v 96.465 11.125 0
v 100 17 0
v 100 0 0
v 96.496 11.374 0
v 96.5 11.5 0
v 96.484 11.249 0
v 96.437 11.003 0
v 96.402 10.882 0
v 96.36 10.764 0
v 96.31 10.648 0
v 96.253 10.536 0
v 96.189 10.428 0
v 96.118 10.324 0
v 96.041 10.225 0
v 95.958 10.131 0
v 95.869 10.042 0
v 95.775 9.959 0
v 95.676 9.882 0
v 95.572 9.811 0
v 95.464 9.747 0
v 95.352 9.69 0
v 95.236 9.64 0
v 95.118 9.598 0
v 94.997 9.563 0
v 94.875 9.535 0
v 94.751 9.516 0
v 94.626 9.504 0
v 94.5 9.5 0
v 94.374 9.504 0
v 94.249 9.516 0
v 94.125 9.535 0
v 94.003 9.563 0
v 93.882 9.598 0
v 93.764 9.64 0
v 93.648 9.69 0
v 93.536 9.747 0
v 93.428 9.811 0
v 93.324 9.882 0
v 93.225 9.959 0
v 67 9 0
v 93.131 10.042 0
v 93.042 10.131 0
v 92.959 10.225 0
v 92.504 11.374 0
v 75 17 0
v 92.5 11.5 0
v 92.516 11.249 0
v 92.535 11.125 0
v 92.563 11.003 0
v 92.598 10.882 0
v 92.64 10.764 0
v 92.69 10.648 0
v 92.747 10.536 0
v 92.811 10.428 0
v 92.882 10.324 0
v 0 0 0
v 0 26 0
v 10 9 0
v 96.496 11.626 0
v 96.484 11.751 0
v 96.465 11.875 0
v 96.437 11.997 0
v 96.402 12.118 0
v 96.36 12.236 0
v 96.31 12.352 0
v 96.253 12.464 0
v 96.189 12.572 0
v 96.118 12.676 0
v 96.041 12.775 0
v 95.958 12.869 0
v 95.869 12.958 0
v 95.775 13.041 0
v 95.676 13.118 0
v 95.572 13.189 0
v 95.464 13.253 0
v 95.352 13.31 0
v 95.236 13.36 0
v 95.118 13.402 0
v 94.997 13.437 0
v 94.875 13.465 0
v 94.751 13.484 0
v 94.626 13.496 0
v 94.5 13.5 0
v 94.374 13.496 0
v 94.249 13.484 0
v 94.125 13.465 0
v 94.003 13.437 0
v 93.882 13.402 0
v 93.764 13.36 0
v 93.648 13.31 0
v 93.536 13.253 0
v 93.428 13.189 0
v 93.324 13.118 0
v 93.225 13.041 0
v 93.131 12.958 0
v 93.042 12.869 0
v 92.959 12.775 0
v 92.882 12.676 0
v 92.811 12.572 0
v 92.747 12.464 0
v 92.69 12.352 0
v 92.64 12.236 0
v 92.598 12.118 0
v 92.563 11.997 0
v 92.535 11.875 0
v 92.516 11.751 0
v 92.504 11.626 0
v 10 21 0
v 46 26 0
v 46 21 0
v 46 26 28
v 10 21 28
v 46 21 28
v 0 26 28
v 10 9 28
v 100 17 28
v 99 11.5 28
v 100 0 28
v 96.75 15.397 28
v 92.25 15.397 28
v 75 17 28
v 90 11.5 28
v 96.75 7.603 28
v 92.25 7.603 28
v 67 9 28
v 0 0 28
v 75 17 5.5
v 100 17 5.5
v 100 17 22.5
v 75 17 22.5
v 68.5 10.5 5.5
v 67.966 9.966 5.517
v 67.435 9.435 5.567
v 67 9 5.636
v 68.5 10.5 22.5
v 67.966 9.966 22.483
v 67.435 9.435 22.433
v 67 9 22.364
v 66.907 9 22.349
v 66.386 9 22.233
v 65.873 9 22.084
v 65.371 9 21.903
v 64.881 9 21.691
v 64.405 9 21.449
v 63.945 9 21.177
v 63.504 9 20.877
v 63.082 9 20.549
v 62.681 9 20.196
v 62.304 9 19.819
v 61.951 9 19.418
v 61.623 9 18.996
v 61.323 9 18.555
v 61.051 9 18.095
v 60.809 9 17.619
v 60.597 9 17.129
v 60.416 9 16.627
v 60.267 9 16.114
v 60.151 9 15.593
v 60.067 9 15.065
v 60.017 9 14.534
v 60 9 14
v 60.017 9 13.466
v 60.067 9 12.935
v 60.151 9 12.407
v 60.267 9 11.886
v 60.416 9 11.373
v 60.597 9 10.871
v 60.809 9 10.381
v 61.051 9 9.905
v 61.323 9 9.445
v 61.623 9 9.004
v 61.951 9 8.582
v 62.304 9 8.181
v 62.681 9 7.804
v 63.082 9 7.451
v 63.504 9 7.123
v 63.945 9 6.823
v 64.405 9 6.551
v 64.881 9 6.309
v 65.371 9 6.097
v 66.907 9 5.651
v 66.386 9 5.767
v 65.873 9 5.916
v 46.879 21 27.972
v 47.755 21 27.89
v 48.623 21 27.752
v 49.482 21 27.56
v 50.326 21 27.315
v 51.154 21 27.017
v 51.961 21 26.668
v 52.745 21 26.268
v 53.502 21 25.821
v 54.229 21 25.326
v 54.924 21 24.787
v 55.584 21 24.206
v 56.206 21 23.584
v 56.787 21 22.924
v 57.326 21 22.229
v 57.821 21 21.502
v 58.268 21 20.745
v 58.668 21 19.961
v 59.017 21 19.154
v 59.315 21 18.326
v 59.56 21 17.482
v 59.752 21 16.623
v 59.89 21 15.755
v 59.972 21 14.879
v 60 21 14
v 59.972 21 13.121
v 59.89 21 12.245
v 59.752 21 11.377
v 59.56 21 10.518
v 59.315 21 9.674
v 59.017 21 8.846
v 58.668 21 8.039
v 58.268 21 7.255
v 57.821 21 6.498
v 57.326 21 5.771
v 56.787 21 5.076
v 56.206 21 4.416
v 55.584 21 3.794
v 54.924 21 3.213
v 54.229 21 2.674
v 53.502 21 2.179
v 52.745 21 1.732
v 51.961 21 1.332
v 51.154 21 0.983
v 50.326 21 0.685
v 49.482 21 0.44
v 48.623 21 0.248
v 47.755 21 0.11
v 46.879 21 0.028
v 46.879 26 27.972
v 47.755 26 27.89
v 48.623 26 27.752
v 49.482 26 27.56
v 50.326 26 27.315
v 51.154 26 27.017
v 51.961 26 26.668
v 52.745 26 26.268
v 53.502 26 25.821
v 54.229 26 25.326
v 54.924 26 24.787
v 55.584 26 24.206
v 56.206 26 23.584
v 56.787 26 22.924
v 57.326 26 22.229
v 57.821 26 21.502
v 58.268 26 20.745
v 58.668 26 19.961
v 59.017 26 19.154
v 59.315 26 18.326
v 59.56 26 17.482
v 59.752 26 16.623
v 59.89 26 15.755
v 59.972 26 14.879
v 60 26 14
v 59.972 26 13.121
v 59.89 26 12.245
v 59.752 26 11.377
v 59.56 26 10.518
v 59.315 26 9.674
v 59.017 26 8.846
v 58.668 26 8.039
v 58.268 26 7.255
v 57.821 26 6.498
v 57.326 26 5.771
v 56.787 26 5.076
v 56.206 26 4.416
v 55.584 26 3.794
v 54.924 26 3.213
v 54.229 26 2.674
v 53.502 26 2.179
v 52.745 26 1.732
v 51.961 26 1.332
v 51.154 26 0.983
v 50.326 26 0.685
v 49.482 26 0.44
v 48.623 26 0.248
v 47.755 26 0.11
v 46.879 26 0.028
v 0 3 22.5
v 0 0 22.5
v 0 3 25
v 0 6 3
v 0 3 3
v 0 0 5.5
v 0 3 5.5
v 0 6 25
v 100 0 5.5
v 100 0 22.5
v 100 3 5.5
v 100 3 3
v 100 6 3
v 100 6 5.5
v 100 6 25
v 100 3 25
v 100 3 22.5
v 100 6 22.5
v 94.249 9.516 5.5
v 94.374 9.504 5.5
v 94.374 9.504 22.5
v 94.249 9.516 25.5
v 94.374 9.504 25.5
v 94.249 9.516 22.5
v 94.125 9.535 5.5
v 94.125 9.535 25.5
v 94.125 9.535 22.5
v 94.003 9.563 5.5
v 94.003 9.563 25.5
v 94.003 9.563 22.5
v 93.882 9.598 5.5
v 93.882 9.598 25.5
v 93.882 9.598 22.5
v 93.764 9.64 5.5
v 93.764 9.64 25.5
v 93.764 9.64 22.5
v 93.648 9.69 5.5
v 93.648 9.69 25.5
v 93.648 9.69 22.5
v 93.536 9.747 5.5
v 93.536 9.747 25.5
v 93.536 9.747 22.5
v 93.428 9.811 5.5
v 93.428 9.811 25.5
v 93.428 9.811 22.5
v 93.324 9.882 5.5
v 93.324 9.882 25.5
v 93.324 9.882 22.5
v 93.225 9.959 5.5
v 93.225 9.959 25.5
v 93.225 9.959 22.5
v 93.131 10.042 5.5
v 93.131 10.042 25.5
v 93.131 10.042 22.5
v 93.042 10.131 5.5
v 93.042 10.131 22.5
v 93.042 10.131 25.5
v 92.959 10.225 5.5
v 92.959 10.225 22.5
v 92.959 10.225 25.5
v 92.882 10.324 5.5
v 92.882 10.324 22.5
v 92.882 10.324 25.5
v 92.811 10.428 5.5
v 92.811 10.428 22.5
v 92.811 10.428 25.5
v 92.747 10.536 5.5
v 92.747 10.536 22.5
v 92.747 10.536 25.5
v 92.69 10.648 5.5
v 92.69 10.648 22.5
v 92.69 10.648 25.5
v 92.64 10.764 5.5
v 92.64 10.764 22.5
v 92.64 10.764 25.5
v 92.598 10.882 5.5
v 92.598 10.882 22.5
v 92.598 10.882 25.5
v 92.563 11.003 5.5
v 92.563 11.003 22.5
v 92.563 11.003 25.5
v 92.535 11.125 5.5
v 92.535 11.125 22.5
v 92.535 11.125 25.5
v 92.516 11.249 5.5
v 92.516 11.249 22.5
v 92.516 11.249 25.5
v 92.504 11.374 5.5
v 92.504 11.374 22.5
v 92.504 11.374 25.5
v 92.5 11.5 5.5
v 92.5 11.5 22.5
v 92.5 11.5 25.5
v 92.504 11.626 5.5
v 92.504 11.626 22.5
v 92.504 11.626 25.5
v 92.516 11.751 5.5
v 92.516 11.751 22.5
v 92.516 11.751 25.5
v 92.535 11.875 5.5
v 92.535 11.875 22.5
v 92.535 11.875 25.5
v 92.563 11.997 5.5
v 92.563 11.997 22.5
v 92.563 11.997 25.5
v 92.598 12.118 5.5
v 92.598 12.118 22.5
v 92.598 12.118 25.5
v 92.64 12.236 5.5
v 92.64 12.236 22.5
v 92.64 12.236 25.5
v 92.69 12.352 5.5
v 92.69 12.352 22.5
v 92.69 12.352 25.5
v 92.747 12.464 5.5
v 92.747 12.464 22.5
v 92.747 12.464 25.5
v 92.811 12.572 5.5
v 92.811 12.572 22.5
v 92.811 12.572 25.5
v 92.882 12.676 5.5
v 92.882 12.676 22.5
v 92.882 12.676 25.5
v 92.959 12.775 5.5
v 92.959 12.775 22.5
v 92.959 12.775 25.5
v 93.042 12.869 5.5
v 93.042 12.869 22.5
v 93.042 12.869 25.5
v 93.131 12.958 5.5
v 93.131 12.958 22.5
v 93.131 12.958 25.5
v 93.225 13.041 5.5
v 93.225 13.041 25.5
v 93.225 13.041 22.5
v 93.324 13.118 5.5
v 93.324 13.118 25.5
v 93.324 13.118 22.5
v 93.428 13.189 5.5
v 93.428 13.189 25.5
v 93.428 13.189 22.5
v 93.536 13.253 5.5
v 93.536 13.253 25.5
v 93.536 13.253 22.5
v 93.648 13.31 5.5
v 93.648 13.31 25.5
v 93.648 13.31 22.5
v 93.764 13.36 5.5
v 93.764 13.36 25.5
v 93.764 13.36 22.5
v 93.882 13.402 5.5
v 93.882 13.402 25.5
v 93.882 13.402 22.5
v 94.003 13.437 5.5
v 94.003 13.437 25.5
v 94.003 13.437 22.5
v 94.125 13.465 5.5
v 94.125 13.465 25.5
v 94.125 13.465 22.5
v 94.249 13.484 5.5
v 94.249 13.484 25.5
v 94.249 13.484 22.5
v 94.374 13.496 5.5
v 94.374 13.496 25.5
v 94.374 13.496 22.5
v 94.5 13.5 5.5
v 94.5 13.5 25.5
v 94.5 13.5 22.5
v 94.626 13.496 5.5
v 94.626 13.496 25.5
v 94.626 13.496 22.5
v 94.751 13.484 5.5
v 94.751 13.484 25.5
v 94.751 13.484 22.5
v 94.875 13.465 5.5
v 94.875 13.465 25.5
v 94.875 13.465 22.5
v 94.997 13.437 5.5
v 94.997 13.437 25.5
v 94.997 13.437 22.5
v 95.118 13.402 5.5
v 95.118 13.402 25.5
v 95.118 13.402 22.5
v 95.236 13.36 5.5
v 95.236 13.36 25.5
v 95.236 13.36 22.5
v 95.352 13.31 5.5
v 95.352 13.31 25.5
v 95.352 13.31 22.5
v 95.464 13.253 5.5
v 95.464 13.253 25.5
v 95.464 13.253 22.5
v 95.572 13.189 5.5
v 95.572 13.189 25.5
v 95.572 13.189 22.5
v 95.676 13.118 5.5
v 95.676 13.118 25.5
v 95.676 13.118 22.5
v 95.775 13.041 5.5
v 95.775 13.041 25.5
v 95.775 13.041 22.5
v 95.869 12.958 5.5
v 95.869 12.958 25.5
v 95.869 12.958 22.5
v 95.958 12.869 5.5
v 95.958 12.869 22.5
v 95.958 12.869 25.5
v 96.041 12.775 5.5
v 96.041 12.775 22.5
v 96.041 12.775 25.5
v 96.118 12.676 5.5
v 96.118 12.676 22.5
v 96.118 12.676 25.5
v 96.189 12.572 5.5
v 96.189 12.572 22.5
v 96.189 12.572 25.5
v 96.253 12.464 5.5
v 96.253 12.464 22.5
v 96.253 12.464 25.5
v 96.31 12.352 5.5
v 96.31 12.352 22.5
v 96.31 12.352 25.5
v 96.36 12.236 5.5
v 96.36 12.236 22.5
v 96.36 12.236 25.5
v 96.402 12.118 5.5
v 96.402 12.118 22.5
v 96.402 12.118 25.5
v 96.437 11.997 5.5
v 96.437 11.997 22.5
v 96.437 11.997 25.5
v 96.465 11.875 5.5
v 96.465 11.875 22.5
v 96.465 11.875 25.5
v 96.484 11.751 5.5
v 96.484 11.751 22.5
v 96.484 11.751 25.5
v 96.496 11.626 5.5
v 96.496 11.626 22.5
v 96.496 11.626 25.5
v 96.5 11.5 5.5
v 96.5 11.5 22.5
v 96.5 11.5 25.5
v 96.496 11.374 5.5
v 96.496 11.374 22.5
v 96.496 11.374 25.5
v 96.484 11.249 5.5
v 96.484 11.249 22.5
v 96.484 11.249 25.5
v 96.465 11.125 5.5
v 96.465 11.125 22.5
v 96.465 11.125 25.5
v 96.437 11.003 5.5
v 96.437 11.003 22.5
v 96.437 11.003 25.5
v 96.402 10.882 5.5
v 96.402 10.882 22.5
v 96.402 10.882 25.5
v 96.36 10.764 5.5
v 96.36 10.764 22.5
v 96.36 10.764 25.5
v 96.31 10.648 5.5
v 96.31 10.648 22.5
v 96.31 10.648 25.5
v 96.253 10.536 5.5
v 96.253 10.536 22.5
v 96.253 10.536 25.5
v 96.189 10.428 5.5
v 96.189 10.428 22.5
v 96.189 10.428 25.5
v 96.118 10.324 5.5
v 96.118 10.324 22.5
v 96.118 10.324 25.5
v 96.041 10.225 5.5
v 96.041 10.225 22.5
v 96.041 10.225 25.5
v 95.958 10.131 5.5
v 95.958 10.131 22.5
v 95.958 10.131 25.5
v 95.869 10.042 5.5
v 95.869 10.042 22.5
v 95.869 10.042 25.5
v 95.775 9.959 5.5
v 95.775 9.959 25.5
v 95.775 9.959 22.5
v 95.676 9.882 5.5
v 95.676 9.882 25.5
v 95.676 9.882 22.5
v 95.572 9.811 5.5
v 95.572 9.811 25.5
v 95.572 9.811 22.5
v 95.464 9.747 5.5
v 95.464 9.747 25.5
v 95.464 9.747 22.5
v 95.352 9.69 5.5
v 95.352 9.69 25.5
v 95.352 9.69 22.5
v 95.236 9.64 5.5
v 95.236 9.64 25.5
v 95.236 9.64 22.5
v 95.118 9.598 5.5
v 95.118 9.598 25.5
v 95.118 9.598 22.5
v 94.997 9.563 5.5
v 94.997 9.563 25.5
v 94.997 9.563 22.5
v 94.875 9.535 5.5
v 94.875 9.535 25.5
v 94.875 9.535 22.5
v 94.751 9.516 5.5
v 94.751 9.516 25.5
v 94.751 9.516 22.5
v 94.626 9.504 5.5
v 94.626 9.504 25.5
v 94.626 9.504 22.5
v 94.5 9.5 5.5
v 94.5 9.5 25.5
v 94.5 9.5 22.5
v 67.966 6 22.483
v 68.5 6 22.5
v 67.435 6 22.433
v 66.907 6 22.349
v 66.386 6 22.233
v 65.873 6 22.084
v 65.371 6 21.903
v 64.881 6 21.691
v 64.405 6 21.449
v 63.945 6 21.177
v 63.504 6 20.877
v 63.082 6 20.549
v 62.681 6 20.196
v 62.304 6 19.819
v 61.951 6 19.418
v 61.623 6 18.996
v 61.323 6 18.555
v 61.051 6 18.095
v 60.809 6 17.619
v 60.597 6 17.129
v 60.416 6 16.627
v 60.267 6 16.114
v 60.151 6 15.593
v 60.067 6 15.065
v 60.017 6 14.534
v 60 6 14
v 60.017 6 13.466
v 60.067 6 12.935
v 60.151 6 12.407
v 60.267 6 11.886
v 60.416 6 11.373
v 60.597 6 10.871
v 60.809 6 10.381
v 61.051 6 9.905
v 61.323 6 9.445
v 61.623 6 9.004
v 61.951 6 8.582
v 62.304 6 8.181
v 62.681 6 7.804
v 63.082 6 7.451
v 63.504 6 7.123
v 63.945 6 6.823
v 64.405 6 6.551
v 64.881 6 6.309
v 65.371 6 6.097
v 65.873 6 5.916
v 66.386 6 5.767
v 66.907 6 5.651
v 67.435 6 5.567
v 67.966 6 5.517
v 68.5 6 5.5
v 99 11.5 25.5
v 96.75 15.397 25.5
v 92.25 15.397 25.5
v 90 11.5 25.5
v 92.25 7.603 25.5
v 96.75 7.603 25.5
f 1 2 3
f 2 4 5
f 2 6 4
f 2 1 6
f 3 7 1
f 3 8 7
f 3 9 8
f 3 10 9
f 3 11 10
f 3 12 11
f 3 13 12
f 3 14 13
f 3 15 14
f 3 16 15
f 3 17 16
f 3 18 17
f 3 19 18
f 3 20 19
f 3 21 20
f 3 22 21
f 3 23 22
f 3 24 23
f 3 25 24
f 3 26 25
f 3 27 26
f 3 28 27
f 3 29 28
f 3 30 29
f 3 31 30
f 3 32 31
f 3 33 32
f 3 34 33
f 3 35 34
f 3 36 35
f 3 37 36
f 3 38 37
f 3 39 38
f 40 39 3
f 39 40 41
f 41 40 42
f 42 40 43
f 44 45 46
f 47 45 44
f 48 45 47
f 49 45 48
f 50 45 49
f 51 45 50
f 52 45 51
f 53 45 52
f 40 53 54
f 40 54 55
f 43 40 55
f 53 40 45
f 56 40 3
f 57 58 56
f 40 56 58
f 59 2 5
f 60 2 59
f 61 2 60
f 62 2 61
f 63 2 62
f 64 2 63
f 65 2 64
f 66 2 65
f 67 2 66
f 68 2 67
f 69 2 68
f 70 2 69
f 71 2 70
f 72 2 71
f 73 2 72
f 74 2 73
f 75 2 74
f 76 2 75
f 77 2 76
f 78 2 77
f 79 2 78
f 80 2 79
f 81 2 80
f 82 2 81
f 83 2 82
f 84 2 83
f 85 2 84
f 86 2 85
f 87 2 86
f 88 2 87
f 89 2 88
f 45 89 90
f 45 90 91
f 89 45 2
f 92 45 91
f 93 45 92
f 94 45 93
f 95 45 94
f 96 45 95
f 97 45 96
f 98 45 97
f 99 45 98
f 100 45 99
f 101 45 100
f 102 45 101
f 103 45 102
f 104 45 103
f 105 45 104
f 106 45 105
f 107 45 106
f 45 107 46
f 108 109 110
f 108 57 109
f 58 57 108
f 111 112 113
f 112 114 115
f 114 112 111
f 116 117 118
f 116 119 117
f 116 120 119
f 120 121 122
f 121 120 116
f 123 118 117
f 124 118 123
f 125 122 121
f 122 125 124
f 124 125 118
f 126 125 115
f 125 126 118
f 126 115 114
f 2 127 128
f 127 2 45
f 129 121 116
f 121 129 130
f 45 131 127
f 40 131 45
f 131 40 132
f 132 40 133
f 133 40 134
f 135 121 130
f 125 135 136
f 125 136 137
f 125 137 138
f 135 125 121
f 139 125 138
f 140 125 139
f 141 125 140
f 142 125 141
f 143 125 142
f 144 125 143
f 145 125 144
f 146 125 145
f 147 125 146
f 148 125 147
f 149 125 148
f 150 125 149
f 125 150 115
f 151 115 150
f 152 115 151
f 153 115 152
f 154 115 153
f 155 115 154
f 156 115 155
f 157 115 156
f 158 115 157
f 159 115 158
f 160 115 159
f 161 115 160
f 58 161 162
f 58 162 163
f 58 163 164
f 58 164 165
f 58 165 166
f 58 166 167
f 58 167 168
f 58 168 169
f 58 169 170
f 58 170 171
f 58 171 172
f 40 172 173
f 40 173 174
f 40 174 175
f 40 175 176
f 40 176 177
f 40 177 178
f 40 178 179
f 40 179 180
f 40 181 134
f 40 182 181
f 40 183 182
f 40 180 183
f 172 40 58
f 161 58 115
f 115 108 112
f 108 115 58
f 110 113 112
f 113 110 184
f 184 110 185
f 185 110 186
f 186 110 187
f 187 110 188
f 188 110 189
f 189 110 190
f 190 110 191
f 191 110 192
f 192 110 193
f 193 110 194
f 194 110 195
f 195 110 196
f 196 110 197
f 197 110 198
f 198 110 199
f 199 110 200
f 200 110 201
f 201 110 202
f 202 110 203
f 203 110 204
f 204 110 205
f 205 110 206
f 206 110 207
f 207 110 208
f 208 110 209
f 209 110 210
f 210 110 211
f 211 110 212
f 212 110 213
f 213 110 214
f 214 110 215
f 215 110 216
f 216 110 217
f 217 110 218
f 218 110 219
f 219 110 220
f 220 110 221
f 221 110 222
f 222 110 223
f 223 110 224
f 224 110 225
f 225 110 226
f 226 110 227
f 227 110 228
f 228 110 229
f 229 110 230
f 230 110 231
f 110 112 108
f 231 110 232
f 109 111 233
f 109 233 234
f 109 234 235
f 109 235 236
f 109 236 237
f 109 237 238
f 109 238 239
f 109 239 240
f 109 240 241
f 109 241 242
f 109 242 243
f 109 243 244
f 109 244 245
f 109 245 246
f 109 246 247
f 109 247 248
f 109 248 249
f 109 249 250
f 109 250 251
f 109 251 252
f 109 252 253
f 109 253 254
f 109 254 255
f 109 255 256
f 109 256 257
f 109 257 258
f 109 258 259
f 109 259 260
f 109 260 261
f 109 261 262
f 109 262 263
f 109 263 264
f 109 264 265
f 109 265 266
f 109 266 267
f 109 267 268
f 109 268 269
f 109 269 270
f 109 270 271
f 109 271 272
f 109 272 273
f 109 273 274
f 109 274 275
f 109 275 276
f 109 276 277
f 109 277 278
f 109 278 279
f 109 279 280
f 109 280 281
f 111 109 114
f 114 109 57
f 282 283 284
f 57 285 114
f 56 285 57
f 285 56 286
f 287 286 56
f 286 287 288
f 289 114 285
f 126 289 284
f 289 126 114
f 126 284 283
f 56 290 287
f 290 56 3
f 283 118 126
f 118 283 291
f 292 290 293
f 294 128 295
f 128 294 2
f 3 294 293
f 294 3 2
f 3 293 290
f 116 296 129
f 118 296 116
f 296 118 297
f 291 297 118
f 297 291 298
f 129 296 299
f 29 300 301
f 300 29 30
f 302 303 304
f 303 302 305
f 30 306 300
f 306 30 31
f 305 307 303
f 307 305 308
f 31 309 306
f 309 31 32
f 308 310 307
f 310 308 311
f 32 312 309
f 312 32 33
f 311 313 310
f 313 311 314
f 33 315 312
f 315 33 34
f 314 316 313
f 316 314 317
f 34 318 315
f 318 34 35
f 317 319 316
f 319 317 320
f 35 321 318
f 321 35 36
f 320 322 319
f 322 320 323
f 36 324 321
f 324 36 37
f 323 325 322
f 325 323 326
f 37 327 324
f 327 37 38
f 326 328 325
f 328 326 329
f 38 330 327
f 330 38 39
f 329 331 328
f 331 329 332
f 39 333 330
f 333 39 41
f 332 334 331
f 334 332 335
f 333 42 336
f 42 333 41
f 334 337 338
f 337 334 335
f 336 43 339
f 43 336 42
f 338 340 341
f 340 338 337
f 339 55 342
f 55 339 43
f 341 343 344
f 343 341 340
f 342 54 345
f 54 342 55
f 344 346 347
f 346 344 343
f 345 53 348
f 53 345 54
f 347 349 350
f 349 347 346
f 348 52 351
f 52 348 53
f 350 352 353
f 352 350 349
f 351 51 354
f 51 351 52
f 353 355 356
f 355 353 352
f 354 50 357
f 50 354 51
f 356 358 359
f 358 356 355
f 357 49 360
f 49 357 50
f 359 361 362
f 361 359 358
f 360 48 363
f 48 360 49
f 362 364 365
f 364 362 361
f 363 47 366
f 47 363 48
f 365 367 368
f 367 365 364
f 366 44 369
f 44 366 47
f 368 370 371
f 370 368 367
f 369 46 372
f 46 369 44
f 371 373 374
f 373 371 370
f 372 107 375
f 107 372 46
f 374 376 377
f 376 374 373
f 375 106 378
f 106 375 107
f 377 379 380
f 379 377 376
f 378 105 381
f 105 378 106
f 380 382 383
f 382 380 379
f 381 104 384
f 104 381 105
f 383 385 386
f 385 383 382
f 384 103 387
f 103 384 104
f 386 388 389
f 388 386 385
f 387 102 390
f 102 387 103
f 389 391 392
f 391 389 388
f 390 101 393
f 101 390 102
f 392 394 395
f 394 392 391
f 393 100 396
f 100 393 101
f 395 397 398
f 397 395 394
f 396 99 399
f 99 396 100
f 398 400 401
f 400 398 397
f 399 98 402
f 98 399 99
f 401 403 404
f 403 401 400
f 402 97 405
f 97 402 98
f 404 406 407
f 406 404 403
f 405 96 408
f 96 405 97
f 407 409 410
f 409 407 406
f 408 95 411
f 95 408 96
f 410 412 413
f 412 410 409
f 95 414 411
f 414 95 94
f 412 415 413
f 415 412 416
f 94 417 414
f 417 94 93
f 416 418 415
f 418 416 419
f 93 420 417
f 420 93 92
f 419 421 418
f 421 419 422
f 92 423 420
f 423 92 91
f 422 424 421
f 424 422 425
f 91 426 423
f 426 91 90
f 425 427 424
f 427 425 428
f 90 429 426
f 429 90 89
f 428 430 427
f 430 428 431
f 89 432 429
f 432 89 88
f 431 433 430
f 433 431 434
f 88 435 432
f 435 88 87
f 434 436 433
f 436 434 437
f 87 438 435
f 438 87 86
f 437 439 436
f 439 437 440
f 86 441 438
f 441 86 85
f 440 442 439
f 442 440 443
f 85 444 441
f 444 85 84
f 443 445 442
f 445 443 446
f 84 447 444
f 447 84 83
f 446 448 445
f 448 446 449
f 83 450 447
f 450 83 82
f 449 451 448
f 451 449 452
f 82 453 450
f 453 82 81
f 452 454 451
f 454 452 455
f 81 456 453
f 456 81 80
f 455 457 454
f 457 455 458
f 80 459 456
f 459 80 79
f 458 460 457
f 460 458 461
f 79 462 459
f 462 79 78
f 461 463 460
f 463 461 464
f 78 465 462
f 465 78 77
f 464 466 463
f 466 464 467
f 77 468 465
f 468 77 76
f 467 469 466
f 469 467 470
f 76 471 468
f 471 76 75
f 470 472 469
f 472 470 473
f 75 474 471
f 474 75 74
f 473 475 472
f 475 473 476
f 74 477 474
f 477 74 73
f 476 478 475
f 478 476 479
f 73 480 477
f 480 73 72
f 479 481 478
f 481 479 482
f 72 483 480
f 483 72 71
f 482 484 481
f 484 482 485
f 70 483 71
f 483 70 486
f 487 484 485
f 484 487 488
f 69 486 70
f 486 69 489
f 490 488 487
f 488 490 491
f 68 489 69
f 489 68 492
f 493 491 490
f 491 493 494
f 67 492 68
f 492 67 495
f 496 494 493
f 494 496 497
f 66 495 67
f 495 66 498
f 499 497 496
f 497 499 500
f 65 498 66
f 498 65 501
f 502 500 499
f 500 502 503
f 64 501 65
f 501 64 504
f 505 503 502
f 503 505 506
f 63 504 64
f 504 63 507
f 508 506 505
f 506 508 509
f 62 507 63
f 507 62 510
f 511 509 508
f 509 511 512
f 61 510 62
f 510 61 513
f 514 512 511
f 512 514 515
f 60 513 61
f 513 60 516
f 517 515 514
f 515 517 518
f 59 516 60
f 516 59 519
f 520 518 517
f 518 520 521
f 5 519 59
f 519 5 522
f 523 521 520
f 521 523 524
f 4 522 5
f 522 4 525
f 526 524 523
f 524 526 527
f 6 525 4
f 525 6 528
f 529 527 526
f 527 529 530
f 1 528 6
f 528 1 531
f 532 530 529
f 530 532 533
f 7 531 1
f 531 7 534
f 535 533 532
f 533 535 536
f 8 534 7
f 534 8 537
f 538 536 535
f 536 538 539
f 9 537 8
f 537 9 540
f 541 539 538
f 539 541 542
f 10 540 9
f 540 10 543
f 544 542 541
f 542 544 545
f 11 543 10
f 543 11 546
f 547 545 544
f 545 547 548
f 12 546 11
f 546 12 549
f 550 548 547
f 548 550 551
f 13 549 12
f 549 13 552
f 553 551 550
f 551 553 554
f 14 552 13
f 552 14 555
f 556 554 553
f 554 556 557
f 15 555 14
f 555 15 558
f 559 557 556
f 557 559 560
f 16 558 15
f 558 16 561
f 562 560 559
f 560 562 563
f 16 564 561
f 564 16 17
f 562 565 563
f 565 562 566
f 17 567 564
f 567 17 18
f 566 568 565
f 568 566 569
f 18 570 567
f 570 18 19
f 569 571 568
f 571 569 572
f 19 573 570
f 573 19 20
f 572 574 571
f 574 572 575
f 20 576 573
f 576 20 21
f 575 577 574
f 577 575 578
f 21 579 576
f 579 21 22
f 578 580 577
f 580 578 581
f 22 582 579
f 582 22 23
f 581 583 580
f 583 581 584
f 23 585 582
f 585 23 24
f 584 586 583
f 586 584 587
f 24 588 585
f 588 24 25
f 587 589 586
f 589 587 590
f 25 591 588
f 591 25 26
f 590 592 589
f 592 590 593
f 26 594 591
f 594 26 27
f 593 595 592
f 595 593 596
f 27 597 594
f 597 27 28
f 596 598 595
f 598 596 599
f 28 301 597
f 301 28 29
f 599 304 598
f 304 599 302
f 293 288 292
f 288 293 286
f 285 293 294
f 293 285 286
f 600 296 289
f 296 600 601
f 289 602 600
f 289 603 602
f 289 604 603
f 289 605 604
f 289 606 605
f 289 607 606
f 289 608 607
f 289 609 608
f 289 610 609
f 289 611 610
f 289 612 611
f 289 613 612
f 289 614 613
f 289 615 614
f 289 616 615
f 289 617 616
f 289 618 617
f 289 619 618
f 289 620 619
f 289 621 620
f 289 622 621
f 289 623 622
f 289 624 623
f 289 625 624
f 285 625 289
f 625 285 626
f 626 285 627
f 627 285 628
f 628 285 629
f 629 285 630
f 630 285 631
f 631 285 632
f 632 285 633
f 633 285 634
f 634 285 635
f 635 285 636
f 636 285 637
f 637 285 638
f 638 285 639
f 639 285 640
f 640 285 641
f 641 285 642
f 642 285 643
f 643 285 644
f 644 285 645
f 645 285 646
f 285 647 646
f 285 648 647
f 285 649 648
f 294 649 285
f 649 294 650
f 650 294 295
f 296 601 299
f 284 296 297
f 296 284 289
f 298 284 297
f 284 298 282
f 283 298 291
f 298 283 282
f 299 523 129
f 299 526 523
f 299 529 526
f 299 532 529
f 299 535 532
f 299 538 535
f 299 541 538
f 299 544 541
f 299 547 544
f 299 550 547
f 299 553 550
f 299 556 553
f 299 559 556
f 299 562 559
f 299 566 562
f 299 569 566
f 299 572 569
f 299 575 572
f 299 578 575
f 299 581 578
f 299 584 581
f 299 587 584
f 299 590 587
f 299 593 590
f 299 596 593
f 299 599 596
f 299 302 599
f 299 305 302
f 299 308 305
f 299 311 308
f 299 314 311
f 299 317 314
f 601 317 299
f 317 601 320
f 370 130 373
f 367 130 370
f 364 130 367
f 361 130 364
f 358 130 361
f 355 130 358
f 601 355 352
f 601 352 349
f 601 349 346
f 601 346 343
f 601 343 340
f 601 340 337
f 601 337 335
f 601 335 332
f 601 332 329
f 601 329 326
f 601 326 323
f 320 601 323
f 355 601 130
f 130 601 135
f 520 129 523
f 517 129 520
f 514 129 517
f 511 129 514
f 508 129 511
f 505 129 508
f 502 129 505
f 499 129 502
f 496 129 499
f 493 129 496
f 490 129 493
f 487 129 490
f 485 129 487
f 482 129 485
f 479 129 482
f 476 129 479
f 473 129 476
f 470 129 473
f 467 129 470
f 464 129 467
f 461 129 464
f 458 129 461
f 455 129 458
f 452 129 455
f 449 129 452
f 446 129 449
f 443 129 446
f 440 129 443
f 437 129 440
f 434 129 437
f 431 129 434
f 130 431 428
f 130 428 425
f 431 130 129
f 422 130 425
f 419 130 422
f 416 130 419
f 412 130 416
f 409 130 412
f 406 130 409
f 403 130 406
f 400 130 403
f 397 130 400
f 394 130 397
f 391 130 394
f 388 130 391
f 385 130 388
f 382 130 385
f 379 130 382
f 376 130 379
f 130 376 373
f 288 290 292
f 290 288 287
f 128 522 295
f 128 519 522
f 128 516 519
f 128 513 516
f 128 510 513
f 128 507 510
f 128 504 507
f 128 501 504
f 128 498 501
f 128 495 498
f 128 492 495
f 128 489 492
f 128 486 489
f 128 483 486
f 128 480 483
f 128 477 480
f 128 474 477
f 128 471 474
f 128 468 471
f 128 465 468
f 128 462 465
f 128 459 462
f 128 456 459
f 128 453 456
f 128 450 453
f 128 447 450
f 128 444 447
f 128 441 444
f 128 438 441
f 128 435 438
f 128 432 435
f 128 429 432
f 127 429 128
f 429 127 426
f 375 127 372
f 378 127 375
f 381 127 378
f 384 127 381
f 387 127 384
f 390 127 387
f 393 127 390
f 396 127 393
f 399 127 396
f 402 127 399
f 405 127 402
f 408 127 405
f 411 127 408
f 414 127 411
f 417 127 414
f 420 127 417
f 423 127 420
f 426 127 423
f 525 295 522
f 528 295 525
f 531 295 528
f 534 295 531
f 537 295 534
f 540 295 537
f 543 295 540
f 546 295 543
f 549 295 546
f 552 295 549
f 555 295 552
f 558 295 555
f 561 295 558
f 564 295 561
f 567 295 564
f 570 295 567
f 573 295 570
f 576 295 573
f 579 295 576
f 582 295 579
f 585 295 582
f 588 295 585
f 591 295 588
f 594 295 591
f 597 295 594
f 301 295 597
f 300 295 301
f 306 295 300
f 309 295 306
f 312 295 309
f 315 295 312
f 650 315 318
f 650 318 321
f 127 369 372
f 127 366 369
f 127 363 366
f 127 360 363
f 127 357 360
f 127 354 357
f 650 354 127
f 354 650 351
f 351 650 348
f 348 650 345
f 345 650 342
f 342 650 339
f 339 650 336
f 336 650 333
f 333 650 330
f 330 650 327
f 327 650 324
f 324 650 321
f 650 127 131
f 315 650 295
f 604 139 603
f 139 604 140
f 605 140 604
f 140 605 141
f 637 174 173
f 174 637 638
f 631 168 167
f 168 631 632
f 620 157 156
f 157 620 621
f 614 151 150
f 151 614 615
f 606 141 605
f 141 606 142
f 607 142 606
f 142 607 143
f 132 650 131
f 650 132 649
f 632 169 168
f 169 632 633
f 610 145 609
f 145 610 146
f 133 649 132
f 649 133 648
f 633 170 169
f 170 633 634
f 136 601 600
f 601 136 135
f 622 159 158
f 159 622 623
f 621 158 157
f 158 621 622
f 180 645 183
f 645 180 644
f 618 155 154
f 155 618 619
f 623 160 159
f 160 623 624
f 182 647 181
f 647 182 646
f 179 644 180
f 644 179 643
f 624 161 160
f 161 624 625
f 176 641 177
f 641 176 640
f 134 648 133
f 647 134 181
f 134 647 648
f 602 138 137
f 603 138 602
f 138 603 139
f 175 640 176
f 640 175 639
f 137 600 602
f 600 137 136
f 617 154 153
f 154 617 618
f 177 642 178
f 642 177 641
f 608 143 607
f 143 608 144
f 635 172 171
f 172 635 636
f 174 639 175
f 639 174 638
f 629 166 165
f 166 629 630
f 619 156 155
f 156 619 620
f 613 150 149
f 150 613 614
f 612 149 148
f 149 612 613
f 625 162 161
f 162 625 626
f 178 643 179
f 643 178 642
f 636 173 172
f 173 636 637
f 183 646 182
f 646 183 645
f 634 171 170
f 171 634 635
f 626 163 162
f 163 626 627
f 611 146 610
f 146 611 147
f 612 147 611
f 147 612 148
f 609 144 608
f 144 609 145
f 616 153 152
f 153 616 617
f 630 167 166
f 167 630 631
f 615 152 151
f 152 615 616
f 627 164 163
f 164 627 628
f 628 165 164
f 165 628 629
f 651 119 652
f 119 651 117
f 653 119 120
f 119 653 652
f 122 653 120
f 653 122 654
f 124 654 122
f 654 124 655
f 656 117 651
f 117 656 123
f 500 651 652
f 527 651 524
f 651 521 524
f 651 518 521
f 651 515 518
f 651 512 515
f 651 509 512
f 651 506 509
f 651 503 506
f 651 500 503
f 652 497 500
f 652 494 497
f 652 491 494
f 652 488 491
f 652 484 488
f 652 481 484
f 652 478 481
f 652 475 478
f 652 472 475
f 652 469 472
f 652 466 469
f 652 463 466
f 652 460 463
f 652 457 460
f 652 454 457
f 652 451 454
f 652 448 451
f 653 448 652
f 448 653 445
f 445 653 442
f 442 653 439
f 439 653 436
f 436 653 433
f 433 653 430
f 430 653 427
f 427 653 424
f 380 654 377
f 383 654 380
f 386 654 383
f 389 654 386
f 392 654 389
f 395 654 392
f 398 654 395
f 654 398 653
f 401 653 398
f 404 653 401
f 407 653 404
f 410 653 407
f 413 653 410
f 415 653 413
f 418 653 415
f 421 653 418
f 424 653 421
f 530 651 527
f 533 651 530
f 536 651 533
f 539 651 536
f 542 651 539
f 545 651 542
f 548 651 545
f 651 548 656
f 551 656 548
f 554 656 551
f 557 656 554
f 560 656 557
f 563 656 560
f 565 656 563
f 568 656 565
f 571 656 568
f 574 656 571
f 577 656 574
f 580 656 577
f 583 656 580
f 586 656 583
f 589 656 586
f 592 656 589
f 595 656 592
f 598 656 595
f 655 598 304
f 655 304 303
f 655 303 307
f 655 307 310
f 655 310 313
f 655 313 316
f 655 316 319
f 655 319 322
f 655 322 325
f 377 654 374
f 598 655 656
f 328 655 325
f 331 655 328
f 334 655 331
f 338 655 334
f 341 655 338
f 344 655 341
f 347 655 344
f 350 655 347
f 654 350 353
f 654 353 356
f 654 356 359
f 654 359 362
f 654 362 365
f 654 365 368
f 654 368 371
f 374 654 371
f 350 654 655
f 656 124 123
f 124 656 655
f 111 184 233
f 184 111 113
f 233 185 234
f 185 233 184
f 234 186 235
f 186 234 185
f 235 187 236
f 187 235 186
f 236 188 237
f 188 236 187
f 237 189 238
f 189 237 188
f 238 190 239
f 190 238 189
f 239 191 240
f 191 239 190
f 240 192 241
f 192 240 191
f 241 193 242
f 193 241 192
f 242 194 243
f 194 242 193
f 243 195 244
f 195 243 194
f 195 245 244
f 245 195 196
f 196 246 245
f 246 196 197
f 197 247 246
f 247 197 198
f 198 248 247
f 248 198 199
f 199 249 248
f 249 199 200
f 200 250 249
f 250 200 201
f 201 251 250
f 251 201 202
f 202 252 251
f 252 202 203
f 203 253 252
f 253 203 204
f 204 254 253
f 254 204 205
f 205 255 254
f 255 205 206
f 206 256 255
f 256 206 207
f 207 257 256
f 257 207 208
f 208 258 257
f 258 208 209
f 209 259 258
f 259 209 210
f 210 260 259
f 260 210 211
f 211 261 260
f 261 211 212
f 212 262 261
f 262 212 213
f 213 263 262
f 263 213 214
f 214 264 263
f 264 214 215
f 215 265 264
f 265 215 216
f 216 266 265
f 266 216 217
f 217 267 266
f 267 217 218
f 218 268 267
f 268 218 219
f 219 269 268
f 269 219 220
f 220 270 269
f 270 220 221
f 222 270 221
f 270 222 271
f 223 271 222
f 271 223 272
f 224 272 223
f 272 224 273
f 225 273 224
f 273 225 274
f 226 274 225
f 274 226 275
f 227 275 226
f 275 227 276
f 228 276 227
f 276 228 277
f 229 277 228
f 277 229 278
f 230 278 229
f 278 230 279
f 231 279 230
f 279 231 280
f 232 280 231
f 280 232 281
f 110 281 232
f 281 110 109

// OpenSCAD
// All measurements are in millimeters

// Special variables
$fn = 100;

// Parameters
clamp_gap = 12;
clamp_bloc = 10;
clamp_arm_thickness = 5;
clamp_length = 50;

base_plate_thickness = 3;

jaw_arm_length = 3;
jaw_arm_thickness = 3;
jaw_tooth_length = 2.5;
jaw_between_arms = 22;

bump_length = 25;
bump_height = 8;
space_between_clamp_and_bump = 15;

hole_radius = 2;

canyon_gap = 17;

bolt_radius = 4.5;
bolt_thickness = 2.5;

// Values depending on parameters
total_width = jaw_arm_thickness + jaw_between_arms + jaw_arm_thickness;
total_length = clamp_bloc + clamp_length + space_between_clamp_and_bump + bump_length;
total_base_thickness = jaw_arm_thickness+jaw_arm_length+base_plate_thickness;
total_bump_height = total_base_thickness+bump_height;
total_height = total_base_thickness + clamp_gap + clamp_arm_thickness;
hole_distance = (base_plate_thickness+bump_height) / 2;

// Constraints
if(hole_radius > base_plate_thickness+bump_height)
{
    hole_radius = base_plate_thickness+bump_height;
}

// Actual model

//rotate([0,-90,-90]) // Rotation for vertical model
difference(){
    linear_extrude(height=total_width)
        difference(){
            // Main shape
            polygon([
                [0, 0],
                [total_length, 0],
                [total_length, total_bump_height],
                [total_length-bump_length, total_bump_height],
                [total_length-bump_length-bump_height, total_base_thickness],
                [clamp_bloc, total_base_thickness],
                [clamp_bloc, total_base_thickness+clamp_gap],
                [clamp_bloc+clamp_length, total_base_thickness+clamp_gap],
                [clamp_bloc+clamp_length, total_base_thickness+clamp_gap+clamp_arm_thickness],
                [0, total_base_thickness+clamp_gap+clamp_arm_thickness],
            ]);
            // Screw hole
            translate([total_length-hole_distance,total_bump_height-hole_distance,0])
                circle(hole_radius);
        }
    // Jaw
    rotate([0,90,0])
        linear_extrude(height=total_length+0.1)
            mirror([1,0,0])
                polygon([
                    [jaw_arm_thickness+jaw_tooth_length, -0.1],
                    [jaw_arm_thickness+jaw_tooth_length, jaw_arm_thickness],
                    [jaw_arm_thickness, jaw_arm_thickness],
                    [jaw_arm_thickness, jaw_arm_thickness+jaw_arm_length],
                    [jaw_arm_thickness+jaw_between_arms, jaw_arm_thickness+jaw_arm_length],
                    [jaw_arm_thickness+jaw_between_arms, jaw_arm_thickness],
                    [jaw_arm_thickness+jaw_between_arms-jaw_tooth_length, jaw_arm_thickness],
                    [jaw_arm_thickness+jaw_between_arms-jaw_tooth_length,-0.1],
                ]);
    // Canyon
    mirror([0,1,0])
        translate([clamp_bloc+clamp_length+canyon_gap/2, 0, (total_width-canyon_gap)/2])
            rotate([90,0,0])
                linear_extrude(height=total_bump_height+0.1)
                    union()
                    {
                        square([0.1+space_between_clamp_and_bump+bump_length-canyon_gap/2, canyon_gap]);
                        translate([0, canyon_gap/2,0])
                            circle(canyon_gap/2);
                    }
    // Bolt space
    translate([0,0,total_width])
        mirror([0,0,1])
            linear_extrude(height=bolt_thickness)
                translate([total_length-hole_distance,total_bump_height-hole_distance,0])
                    circle(r=bolt_radius, $fn=6);
    // Rounded clamp
    translate([clamp_length+clamp_bloc-total_width/2, total_height,0])
    rotate([90,0,0])
    linear_extrude(height=clamp_arm_thickness)
    difference()
    {
        square([0.1+total_width/2, total_width]);
        translate([0,total_width/2,0]) circle(total_width/2);
    }
}
